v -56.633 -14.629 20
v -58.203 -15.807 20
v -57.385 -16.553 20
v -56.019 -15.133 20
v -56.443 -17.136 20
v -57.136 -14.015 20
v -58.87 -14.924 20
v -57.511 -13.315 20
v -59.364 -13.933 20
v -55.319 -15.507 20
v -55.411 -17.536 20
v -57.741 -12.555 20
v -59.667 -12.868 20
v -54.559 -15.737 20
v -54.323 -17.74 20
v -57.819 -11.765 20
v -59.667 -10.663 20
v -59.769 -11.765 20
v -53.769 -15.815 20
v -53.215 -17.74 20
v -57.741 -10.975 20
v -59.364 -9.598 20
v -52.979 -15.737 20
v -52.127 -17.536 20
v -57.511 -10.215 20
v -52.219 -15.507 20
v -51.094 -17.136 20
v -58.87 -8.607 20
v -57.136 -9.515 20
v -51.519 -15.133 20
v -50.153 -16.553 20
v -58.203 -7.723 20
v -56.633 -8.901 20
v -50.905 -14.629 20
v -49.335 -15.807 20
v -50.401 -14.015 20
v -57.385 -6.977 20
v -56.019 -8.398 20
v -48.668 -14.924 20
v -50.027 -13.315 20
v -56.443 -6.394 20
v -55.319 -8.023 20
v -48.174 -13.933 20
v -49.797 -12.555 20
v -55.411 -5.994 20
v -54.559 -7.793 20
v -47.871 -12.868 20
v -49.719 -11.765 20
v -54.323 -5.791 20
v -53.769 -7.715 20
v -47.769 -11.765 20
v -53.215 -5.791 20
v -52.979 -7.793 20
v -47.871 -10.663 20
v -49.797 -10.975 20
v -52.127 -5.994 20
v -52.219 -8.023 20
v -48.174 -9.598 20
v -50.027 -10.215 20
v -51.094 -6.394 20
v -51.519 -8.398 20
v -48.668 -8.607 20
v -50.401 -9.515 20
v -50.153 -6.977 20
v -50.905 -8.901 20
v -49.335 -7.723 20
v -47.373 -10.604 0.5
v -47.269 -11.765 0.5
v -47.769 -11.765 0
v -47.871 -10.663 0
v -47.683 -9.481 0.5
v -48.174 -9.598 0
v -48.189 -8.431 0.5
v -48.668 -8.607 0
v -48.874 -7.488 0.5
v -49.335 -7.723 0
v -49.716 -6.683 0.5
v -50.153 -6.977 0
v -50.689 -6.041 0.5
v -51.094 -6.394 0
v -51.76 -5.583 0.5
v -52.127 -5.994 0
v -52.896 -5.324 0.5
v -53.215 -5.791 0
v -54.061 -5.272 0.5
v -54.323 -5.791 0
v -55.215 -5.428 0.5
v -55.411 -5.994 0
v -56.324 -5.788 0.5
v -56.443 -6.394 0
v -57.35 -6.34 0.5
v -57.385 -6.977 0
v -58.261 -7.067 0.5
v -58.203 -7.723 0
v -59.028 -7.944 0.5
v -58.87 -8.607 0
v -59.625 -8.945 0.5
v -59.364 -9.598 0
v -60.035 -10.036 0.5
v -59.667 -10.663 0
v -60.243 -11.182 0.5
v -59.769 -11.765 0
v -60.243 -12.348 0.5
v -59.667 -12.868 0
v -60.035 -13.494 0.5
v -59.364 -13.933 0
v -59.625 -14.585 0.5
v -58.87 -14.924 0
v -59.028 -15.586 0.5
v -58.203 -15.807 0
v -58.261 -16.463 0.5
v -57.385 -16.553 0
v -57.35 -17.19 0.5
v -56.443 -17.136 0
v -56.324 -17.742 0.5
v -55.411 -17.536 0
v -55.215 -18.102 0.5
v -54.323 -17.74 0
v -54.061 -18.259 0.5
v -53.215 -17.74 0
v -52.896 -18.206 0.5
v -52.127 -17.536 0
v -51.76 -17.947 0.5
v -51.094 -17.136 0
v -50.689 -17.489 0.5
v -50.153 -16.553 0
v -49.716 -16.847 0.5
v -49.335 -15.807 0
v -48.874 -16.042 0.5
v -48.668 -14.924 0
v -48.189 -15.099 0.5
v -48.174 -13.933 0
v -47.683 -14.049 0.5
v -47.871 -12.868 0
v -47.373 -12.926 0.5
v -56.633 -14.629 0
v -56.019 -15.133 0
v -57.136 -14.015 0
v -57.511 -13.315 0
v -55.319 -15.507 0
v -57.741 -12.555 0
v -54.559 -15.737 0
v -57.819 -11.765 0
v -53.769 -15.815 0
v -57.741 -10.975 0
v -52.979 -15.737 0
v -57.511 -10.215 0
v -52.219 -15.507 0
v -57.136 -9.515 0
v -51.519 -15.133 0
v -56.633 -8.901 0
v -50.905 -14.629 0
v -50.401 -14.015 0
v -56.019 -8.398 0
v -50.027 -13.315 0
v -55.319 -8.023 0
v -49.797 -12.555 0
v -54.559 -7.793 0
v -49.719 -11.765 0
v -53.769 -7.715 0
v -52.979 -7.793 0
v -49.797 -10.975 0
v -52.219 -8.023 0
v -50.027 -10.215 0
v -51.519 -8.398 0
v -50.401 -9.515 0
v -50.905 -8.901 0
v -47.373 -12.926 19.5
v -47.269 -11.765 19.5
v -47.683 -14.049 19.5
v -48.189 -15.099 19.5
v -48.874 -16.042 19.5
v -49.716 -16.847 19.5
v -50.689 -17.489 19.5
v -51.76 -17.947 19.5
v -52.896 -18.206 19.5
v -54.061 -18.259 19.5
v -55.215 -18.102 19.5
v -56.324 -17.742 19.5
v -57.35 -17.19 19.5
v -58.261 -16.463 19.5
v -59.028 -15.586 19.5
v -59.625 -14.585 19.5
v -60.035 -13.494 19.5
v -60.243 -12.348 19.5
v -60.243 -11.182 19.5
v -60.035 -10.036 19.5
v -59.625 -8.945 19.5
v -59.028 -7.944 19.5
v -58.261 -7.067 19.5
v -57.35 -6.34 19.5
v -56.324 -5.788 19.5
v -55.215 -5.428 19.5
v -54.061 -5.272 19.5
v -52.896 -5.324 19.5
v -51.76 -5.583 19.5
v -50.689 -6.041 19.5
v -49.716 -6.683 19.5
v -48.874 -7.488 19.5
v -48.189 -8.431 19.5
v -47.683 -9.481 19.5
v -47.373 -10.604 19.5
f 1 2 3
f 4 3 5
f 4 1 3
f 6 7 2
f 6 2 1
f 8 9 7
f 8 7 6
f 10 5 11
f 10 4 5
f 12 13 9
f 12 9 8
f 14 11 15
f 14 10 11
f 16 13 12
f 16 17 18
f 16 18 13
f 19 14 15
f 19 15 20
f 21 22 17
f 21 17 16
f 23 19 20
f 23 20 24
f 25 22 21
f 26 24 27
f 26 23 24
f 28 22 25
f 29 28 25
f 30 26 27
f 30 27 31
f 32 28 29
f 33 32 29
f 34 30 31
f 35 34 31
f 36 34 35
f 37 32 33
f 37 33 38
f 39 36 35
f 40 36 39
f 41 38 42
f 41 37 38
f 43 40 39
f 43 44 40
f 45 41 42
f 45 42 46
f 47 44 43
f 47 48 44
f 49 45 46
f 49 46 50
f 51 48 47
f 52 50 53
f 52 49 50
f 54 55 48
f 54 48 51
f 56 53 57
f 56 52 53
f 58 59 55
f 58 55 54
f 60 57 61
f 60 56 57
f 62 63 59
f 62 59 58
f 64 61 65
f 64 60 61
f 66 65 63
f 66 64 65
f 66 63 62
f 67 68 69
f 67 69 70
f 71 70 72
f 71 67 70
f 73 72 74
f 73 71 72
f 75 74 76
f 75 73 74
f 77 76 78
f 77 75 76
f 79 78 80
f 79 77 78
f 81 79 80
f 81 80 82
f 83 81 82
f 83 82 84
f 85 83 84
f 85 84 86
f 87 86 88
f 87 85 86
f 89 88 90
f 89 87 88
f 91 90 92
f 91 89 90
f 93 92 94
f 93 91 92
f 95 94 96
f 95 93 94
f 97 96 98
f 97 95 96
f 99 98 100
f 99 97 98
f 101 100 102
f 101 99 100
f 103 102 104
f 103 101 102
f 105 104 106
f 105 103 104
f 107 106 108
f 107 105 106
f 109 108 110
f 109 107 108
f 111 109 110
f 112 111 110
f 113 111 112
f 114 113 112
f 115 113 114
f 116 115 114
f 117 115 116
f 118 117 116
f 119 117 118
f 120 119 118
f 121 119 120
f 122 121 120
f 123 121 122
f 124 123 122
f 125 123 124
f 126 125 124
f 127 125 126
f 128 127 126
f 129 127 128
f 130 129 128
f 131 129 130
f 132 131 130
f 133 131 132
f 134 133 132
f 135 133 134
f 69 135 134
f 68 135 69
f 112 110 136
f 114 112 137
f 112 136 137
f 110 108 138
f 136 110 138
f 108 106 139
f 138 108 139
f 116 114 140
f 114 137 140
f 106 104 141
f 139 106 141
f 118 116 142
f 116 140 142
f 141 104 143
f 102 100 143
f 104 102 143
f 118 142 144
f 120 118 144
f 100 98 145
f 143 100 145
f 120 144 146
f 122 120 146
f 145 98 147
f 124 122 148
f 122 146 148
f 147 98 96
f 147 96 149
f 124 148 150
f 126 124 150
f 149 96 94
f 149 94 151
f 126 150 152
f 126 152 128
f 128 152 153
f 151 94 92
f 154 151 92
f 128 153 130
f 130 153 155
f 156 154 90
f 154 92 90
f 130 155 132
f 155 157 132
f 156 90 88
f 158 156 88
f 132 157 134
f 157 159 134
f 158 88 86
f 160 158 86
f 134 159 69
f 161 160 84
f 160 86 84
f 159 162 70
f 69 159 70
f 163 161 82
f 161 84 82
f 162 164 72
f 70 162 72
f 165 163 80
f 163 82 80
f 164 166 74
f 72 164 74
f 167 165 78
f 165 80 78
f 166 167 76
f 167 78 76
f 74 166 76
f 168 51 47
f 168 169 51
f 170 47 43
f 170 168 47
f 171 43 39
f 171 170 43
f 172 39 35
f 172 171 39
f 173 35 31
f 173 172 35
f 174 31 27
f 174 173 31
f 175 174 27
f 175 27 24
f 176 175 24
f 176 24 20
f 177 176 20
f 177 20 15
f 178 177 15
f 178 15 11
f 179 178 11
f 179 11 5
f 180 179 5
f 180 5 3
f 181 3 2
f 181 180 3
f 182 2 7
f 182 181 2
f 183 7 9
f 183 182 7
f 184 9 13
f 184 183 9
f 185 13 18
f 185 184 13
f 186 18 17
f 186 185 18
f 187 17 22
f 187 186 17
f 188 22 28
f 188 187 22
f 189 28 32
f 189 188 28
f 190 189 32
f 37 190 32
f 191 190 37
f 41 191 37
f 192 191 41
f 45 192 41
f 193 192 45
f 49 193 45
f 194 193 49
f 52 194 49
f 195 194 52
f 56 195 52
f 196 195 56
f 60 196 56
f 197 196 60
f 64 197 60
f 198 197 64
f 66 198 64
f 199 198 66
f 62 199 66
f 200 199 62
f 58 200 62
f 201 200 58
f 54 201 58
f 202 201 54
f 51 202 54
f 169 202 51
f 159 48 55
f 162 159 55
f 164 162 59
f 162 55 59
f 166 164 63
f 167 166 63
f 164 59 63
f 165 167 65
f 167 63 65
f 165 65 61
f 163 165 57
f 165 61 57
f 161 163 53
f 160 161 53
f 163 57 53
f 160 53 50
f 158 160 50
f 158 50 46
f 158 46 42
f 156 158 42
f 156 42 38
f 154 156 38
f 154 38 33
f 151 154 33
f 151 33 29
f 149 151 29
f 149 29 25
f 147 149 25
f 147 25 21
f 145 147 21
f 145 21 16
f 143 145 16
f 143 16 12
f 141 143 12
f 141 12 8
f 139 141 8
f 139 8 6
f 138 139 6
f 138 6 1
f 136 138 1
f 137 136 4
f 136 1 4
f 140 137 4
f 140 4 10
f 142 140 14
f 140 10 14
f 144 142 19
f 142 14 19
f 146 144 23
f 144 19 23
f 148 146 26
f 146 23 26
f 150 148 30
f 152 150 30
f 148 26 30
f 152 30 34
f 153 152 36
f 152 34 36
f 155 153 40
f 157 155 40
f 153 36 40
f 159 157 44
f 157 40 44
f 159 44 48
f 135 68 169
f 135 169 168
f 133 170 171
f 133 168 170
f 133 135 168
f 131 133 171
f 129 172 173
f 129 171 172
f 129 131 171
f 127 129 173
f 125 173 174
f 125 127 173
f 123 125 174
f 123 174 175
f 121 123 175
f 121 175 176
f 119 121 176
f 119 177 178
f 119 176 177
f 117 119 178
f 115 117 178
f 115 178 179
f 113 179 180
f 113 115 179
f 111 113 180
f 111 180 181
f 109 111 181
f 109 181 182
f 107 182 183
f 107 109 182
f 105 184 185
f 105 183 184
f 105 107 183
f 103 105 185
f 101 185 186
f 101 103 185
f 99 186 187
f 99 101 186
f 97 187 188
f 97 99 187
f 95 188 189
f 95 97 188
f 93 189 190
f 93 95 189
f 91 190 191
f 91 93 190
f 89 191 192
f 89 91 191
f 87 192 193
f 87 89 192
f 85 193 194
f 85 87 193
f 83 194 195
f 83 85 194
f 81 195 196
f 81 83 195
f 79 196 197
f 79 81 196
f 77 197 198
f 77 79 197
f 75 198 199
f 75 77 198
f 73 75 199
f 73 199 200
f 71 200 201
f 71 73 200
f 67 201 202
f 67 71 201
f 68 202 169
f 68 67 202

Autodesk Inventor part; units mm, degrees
ref_plane "YZ Plane" through (0, 0, 0) normal (1, 0, 0) x (0, 1, 0)
ref_plane "XZ Plane" through (0, 0, 0) normal (0, 1, 0) x (-1, 0, 0)
ref_plane "XY Plane" through (0, 0, 0) normal (0, 0, 1) x (1, 0, 0)
ref_plane "Work Plane1" through (0, 0, 0) normal (0, 0, 1) x (1, 0, 0)
sketch "Sketch1" plane through (0, 0, 0) normal (0, 0, 1) x (1, 0, 0)
  circle A0 centre (-53.7689, -11.7651) radius 3.2332 projected
  circle A1 centre (-53.7689, -11.7651) radius 4.05
  circle A2 centre (-53.7689, -11.7651) radius 6.5
  point P0 (0, 0)
  point P1 (-52.2586, -9.305)
  dimension "d0" = 8.1
  dimension "d1" = 13
extrude "Extrusion1" add sketch "Sketch1" along normal blind 20 contours A0 | A1 | A2
chamfer "Chamfer1" distance 0.5 angle 45 2 edges at (-60.2689, -11.7651, 0) (-60.2689, -11.7651, 20)
sketch "Sketch2" plane through (-53.7689, -11.7651, 20) normal (0, 0, 1) x (1, 0, 0)
  circle A0 centre (0, 0) radius 4.05
  point P0 (53.7689, 11.7651)
  dimension "d7" = 8.1
extrude "Extrusion2" cut sketch "Sketch2" against normal blind 20
properties part number "Spacers"
